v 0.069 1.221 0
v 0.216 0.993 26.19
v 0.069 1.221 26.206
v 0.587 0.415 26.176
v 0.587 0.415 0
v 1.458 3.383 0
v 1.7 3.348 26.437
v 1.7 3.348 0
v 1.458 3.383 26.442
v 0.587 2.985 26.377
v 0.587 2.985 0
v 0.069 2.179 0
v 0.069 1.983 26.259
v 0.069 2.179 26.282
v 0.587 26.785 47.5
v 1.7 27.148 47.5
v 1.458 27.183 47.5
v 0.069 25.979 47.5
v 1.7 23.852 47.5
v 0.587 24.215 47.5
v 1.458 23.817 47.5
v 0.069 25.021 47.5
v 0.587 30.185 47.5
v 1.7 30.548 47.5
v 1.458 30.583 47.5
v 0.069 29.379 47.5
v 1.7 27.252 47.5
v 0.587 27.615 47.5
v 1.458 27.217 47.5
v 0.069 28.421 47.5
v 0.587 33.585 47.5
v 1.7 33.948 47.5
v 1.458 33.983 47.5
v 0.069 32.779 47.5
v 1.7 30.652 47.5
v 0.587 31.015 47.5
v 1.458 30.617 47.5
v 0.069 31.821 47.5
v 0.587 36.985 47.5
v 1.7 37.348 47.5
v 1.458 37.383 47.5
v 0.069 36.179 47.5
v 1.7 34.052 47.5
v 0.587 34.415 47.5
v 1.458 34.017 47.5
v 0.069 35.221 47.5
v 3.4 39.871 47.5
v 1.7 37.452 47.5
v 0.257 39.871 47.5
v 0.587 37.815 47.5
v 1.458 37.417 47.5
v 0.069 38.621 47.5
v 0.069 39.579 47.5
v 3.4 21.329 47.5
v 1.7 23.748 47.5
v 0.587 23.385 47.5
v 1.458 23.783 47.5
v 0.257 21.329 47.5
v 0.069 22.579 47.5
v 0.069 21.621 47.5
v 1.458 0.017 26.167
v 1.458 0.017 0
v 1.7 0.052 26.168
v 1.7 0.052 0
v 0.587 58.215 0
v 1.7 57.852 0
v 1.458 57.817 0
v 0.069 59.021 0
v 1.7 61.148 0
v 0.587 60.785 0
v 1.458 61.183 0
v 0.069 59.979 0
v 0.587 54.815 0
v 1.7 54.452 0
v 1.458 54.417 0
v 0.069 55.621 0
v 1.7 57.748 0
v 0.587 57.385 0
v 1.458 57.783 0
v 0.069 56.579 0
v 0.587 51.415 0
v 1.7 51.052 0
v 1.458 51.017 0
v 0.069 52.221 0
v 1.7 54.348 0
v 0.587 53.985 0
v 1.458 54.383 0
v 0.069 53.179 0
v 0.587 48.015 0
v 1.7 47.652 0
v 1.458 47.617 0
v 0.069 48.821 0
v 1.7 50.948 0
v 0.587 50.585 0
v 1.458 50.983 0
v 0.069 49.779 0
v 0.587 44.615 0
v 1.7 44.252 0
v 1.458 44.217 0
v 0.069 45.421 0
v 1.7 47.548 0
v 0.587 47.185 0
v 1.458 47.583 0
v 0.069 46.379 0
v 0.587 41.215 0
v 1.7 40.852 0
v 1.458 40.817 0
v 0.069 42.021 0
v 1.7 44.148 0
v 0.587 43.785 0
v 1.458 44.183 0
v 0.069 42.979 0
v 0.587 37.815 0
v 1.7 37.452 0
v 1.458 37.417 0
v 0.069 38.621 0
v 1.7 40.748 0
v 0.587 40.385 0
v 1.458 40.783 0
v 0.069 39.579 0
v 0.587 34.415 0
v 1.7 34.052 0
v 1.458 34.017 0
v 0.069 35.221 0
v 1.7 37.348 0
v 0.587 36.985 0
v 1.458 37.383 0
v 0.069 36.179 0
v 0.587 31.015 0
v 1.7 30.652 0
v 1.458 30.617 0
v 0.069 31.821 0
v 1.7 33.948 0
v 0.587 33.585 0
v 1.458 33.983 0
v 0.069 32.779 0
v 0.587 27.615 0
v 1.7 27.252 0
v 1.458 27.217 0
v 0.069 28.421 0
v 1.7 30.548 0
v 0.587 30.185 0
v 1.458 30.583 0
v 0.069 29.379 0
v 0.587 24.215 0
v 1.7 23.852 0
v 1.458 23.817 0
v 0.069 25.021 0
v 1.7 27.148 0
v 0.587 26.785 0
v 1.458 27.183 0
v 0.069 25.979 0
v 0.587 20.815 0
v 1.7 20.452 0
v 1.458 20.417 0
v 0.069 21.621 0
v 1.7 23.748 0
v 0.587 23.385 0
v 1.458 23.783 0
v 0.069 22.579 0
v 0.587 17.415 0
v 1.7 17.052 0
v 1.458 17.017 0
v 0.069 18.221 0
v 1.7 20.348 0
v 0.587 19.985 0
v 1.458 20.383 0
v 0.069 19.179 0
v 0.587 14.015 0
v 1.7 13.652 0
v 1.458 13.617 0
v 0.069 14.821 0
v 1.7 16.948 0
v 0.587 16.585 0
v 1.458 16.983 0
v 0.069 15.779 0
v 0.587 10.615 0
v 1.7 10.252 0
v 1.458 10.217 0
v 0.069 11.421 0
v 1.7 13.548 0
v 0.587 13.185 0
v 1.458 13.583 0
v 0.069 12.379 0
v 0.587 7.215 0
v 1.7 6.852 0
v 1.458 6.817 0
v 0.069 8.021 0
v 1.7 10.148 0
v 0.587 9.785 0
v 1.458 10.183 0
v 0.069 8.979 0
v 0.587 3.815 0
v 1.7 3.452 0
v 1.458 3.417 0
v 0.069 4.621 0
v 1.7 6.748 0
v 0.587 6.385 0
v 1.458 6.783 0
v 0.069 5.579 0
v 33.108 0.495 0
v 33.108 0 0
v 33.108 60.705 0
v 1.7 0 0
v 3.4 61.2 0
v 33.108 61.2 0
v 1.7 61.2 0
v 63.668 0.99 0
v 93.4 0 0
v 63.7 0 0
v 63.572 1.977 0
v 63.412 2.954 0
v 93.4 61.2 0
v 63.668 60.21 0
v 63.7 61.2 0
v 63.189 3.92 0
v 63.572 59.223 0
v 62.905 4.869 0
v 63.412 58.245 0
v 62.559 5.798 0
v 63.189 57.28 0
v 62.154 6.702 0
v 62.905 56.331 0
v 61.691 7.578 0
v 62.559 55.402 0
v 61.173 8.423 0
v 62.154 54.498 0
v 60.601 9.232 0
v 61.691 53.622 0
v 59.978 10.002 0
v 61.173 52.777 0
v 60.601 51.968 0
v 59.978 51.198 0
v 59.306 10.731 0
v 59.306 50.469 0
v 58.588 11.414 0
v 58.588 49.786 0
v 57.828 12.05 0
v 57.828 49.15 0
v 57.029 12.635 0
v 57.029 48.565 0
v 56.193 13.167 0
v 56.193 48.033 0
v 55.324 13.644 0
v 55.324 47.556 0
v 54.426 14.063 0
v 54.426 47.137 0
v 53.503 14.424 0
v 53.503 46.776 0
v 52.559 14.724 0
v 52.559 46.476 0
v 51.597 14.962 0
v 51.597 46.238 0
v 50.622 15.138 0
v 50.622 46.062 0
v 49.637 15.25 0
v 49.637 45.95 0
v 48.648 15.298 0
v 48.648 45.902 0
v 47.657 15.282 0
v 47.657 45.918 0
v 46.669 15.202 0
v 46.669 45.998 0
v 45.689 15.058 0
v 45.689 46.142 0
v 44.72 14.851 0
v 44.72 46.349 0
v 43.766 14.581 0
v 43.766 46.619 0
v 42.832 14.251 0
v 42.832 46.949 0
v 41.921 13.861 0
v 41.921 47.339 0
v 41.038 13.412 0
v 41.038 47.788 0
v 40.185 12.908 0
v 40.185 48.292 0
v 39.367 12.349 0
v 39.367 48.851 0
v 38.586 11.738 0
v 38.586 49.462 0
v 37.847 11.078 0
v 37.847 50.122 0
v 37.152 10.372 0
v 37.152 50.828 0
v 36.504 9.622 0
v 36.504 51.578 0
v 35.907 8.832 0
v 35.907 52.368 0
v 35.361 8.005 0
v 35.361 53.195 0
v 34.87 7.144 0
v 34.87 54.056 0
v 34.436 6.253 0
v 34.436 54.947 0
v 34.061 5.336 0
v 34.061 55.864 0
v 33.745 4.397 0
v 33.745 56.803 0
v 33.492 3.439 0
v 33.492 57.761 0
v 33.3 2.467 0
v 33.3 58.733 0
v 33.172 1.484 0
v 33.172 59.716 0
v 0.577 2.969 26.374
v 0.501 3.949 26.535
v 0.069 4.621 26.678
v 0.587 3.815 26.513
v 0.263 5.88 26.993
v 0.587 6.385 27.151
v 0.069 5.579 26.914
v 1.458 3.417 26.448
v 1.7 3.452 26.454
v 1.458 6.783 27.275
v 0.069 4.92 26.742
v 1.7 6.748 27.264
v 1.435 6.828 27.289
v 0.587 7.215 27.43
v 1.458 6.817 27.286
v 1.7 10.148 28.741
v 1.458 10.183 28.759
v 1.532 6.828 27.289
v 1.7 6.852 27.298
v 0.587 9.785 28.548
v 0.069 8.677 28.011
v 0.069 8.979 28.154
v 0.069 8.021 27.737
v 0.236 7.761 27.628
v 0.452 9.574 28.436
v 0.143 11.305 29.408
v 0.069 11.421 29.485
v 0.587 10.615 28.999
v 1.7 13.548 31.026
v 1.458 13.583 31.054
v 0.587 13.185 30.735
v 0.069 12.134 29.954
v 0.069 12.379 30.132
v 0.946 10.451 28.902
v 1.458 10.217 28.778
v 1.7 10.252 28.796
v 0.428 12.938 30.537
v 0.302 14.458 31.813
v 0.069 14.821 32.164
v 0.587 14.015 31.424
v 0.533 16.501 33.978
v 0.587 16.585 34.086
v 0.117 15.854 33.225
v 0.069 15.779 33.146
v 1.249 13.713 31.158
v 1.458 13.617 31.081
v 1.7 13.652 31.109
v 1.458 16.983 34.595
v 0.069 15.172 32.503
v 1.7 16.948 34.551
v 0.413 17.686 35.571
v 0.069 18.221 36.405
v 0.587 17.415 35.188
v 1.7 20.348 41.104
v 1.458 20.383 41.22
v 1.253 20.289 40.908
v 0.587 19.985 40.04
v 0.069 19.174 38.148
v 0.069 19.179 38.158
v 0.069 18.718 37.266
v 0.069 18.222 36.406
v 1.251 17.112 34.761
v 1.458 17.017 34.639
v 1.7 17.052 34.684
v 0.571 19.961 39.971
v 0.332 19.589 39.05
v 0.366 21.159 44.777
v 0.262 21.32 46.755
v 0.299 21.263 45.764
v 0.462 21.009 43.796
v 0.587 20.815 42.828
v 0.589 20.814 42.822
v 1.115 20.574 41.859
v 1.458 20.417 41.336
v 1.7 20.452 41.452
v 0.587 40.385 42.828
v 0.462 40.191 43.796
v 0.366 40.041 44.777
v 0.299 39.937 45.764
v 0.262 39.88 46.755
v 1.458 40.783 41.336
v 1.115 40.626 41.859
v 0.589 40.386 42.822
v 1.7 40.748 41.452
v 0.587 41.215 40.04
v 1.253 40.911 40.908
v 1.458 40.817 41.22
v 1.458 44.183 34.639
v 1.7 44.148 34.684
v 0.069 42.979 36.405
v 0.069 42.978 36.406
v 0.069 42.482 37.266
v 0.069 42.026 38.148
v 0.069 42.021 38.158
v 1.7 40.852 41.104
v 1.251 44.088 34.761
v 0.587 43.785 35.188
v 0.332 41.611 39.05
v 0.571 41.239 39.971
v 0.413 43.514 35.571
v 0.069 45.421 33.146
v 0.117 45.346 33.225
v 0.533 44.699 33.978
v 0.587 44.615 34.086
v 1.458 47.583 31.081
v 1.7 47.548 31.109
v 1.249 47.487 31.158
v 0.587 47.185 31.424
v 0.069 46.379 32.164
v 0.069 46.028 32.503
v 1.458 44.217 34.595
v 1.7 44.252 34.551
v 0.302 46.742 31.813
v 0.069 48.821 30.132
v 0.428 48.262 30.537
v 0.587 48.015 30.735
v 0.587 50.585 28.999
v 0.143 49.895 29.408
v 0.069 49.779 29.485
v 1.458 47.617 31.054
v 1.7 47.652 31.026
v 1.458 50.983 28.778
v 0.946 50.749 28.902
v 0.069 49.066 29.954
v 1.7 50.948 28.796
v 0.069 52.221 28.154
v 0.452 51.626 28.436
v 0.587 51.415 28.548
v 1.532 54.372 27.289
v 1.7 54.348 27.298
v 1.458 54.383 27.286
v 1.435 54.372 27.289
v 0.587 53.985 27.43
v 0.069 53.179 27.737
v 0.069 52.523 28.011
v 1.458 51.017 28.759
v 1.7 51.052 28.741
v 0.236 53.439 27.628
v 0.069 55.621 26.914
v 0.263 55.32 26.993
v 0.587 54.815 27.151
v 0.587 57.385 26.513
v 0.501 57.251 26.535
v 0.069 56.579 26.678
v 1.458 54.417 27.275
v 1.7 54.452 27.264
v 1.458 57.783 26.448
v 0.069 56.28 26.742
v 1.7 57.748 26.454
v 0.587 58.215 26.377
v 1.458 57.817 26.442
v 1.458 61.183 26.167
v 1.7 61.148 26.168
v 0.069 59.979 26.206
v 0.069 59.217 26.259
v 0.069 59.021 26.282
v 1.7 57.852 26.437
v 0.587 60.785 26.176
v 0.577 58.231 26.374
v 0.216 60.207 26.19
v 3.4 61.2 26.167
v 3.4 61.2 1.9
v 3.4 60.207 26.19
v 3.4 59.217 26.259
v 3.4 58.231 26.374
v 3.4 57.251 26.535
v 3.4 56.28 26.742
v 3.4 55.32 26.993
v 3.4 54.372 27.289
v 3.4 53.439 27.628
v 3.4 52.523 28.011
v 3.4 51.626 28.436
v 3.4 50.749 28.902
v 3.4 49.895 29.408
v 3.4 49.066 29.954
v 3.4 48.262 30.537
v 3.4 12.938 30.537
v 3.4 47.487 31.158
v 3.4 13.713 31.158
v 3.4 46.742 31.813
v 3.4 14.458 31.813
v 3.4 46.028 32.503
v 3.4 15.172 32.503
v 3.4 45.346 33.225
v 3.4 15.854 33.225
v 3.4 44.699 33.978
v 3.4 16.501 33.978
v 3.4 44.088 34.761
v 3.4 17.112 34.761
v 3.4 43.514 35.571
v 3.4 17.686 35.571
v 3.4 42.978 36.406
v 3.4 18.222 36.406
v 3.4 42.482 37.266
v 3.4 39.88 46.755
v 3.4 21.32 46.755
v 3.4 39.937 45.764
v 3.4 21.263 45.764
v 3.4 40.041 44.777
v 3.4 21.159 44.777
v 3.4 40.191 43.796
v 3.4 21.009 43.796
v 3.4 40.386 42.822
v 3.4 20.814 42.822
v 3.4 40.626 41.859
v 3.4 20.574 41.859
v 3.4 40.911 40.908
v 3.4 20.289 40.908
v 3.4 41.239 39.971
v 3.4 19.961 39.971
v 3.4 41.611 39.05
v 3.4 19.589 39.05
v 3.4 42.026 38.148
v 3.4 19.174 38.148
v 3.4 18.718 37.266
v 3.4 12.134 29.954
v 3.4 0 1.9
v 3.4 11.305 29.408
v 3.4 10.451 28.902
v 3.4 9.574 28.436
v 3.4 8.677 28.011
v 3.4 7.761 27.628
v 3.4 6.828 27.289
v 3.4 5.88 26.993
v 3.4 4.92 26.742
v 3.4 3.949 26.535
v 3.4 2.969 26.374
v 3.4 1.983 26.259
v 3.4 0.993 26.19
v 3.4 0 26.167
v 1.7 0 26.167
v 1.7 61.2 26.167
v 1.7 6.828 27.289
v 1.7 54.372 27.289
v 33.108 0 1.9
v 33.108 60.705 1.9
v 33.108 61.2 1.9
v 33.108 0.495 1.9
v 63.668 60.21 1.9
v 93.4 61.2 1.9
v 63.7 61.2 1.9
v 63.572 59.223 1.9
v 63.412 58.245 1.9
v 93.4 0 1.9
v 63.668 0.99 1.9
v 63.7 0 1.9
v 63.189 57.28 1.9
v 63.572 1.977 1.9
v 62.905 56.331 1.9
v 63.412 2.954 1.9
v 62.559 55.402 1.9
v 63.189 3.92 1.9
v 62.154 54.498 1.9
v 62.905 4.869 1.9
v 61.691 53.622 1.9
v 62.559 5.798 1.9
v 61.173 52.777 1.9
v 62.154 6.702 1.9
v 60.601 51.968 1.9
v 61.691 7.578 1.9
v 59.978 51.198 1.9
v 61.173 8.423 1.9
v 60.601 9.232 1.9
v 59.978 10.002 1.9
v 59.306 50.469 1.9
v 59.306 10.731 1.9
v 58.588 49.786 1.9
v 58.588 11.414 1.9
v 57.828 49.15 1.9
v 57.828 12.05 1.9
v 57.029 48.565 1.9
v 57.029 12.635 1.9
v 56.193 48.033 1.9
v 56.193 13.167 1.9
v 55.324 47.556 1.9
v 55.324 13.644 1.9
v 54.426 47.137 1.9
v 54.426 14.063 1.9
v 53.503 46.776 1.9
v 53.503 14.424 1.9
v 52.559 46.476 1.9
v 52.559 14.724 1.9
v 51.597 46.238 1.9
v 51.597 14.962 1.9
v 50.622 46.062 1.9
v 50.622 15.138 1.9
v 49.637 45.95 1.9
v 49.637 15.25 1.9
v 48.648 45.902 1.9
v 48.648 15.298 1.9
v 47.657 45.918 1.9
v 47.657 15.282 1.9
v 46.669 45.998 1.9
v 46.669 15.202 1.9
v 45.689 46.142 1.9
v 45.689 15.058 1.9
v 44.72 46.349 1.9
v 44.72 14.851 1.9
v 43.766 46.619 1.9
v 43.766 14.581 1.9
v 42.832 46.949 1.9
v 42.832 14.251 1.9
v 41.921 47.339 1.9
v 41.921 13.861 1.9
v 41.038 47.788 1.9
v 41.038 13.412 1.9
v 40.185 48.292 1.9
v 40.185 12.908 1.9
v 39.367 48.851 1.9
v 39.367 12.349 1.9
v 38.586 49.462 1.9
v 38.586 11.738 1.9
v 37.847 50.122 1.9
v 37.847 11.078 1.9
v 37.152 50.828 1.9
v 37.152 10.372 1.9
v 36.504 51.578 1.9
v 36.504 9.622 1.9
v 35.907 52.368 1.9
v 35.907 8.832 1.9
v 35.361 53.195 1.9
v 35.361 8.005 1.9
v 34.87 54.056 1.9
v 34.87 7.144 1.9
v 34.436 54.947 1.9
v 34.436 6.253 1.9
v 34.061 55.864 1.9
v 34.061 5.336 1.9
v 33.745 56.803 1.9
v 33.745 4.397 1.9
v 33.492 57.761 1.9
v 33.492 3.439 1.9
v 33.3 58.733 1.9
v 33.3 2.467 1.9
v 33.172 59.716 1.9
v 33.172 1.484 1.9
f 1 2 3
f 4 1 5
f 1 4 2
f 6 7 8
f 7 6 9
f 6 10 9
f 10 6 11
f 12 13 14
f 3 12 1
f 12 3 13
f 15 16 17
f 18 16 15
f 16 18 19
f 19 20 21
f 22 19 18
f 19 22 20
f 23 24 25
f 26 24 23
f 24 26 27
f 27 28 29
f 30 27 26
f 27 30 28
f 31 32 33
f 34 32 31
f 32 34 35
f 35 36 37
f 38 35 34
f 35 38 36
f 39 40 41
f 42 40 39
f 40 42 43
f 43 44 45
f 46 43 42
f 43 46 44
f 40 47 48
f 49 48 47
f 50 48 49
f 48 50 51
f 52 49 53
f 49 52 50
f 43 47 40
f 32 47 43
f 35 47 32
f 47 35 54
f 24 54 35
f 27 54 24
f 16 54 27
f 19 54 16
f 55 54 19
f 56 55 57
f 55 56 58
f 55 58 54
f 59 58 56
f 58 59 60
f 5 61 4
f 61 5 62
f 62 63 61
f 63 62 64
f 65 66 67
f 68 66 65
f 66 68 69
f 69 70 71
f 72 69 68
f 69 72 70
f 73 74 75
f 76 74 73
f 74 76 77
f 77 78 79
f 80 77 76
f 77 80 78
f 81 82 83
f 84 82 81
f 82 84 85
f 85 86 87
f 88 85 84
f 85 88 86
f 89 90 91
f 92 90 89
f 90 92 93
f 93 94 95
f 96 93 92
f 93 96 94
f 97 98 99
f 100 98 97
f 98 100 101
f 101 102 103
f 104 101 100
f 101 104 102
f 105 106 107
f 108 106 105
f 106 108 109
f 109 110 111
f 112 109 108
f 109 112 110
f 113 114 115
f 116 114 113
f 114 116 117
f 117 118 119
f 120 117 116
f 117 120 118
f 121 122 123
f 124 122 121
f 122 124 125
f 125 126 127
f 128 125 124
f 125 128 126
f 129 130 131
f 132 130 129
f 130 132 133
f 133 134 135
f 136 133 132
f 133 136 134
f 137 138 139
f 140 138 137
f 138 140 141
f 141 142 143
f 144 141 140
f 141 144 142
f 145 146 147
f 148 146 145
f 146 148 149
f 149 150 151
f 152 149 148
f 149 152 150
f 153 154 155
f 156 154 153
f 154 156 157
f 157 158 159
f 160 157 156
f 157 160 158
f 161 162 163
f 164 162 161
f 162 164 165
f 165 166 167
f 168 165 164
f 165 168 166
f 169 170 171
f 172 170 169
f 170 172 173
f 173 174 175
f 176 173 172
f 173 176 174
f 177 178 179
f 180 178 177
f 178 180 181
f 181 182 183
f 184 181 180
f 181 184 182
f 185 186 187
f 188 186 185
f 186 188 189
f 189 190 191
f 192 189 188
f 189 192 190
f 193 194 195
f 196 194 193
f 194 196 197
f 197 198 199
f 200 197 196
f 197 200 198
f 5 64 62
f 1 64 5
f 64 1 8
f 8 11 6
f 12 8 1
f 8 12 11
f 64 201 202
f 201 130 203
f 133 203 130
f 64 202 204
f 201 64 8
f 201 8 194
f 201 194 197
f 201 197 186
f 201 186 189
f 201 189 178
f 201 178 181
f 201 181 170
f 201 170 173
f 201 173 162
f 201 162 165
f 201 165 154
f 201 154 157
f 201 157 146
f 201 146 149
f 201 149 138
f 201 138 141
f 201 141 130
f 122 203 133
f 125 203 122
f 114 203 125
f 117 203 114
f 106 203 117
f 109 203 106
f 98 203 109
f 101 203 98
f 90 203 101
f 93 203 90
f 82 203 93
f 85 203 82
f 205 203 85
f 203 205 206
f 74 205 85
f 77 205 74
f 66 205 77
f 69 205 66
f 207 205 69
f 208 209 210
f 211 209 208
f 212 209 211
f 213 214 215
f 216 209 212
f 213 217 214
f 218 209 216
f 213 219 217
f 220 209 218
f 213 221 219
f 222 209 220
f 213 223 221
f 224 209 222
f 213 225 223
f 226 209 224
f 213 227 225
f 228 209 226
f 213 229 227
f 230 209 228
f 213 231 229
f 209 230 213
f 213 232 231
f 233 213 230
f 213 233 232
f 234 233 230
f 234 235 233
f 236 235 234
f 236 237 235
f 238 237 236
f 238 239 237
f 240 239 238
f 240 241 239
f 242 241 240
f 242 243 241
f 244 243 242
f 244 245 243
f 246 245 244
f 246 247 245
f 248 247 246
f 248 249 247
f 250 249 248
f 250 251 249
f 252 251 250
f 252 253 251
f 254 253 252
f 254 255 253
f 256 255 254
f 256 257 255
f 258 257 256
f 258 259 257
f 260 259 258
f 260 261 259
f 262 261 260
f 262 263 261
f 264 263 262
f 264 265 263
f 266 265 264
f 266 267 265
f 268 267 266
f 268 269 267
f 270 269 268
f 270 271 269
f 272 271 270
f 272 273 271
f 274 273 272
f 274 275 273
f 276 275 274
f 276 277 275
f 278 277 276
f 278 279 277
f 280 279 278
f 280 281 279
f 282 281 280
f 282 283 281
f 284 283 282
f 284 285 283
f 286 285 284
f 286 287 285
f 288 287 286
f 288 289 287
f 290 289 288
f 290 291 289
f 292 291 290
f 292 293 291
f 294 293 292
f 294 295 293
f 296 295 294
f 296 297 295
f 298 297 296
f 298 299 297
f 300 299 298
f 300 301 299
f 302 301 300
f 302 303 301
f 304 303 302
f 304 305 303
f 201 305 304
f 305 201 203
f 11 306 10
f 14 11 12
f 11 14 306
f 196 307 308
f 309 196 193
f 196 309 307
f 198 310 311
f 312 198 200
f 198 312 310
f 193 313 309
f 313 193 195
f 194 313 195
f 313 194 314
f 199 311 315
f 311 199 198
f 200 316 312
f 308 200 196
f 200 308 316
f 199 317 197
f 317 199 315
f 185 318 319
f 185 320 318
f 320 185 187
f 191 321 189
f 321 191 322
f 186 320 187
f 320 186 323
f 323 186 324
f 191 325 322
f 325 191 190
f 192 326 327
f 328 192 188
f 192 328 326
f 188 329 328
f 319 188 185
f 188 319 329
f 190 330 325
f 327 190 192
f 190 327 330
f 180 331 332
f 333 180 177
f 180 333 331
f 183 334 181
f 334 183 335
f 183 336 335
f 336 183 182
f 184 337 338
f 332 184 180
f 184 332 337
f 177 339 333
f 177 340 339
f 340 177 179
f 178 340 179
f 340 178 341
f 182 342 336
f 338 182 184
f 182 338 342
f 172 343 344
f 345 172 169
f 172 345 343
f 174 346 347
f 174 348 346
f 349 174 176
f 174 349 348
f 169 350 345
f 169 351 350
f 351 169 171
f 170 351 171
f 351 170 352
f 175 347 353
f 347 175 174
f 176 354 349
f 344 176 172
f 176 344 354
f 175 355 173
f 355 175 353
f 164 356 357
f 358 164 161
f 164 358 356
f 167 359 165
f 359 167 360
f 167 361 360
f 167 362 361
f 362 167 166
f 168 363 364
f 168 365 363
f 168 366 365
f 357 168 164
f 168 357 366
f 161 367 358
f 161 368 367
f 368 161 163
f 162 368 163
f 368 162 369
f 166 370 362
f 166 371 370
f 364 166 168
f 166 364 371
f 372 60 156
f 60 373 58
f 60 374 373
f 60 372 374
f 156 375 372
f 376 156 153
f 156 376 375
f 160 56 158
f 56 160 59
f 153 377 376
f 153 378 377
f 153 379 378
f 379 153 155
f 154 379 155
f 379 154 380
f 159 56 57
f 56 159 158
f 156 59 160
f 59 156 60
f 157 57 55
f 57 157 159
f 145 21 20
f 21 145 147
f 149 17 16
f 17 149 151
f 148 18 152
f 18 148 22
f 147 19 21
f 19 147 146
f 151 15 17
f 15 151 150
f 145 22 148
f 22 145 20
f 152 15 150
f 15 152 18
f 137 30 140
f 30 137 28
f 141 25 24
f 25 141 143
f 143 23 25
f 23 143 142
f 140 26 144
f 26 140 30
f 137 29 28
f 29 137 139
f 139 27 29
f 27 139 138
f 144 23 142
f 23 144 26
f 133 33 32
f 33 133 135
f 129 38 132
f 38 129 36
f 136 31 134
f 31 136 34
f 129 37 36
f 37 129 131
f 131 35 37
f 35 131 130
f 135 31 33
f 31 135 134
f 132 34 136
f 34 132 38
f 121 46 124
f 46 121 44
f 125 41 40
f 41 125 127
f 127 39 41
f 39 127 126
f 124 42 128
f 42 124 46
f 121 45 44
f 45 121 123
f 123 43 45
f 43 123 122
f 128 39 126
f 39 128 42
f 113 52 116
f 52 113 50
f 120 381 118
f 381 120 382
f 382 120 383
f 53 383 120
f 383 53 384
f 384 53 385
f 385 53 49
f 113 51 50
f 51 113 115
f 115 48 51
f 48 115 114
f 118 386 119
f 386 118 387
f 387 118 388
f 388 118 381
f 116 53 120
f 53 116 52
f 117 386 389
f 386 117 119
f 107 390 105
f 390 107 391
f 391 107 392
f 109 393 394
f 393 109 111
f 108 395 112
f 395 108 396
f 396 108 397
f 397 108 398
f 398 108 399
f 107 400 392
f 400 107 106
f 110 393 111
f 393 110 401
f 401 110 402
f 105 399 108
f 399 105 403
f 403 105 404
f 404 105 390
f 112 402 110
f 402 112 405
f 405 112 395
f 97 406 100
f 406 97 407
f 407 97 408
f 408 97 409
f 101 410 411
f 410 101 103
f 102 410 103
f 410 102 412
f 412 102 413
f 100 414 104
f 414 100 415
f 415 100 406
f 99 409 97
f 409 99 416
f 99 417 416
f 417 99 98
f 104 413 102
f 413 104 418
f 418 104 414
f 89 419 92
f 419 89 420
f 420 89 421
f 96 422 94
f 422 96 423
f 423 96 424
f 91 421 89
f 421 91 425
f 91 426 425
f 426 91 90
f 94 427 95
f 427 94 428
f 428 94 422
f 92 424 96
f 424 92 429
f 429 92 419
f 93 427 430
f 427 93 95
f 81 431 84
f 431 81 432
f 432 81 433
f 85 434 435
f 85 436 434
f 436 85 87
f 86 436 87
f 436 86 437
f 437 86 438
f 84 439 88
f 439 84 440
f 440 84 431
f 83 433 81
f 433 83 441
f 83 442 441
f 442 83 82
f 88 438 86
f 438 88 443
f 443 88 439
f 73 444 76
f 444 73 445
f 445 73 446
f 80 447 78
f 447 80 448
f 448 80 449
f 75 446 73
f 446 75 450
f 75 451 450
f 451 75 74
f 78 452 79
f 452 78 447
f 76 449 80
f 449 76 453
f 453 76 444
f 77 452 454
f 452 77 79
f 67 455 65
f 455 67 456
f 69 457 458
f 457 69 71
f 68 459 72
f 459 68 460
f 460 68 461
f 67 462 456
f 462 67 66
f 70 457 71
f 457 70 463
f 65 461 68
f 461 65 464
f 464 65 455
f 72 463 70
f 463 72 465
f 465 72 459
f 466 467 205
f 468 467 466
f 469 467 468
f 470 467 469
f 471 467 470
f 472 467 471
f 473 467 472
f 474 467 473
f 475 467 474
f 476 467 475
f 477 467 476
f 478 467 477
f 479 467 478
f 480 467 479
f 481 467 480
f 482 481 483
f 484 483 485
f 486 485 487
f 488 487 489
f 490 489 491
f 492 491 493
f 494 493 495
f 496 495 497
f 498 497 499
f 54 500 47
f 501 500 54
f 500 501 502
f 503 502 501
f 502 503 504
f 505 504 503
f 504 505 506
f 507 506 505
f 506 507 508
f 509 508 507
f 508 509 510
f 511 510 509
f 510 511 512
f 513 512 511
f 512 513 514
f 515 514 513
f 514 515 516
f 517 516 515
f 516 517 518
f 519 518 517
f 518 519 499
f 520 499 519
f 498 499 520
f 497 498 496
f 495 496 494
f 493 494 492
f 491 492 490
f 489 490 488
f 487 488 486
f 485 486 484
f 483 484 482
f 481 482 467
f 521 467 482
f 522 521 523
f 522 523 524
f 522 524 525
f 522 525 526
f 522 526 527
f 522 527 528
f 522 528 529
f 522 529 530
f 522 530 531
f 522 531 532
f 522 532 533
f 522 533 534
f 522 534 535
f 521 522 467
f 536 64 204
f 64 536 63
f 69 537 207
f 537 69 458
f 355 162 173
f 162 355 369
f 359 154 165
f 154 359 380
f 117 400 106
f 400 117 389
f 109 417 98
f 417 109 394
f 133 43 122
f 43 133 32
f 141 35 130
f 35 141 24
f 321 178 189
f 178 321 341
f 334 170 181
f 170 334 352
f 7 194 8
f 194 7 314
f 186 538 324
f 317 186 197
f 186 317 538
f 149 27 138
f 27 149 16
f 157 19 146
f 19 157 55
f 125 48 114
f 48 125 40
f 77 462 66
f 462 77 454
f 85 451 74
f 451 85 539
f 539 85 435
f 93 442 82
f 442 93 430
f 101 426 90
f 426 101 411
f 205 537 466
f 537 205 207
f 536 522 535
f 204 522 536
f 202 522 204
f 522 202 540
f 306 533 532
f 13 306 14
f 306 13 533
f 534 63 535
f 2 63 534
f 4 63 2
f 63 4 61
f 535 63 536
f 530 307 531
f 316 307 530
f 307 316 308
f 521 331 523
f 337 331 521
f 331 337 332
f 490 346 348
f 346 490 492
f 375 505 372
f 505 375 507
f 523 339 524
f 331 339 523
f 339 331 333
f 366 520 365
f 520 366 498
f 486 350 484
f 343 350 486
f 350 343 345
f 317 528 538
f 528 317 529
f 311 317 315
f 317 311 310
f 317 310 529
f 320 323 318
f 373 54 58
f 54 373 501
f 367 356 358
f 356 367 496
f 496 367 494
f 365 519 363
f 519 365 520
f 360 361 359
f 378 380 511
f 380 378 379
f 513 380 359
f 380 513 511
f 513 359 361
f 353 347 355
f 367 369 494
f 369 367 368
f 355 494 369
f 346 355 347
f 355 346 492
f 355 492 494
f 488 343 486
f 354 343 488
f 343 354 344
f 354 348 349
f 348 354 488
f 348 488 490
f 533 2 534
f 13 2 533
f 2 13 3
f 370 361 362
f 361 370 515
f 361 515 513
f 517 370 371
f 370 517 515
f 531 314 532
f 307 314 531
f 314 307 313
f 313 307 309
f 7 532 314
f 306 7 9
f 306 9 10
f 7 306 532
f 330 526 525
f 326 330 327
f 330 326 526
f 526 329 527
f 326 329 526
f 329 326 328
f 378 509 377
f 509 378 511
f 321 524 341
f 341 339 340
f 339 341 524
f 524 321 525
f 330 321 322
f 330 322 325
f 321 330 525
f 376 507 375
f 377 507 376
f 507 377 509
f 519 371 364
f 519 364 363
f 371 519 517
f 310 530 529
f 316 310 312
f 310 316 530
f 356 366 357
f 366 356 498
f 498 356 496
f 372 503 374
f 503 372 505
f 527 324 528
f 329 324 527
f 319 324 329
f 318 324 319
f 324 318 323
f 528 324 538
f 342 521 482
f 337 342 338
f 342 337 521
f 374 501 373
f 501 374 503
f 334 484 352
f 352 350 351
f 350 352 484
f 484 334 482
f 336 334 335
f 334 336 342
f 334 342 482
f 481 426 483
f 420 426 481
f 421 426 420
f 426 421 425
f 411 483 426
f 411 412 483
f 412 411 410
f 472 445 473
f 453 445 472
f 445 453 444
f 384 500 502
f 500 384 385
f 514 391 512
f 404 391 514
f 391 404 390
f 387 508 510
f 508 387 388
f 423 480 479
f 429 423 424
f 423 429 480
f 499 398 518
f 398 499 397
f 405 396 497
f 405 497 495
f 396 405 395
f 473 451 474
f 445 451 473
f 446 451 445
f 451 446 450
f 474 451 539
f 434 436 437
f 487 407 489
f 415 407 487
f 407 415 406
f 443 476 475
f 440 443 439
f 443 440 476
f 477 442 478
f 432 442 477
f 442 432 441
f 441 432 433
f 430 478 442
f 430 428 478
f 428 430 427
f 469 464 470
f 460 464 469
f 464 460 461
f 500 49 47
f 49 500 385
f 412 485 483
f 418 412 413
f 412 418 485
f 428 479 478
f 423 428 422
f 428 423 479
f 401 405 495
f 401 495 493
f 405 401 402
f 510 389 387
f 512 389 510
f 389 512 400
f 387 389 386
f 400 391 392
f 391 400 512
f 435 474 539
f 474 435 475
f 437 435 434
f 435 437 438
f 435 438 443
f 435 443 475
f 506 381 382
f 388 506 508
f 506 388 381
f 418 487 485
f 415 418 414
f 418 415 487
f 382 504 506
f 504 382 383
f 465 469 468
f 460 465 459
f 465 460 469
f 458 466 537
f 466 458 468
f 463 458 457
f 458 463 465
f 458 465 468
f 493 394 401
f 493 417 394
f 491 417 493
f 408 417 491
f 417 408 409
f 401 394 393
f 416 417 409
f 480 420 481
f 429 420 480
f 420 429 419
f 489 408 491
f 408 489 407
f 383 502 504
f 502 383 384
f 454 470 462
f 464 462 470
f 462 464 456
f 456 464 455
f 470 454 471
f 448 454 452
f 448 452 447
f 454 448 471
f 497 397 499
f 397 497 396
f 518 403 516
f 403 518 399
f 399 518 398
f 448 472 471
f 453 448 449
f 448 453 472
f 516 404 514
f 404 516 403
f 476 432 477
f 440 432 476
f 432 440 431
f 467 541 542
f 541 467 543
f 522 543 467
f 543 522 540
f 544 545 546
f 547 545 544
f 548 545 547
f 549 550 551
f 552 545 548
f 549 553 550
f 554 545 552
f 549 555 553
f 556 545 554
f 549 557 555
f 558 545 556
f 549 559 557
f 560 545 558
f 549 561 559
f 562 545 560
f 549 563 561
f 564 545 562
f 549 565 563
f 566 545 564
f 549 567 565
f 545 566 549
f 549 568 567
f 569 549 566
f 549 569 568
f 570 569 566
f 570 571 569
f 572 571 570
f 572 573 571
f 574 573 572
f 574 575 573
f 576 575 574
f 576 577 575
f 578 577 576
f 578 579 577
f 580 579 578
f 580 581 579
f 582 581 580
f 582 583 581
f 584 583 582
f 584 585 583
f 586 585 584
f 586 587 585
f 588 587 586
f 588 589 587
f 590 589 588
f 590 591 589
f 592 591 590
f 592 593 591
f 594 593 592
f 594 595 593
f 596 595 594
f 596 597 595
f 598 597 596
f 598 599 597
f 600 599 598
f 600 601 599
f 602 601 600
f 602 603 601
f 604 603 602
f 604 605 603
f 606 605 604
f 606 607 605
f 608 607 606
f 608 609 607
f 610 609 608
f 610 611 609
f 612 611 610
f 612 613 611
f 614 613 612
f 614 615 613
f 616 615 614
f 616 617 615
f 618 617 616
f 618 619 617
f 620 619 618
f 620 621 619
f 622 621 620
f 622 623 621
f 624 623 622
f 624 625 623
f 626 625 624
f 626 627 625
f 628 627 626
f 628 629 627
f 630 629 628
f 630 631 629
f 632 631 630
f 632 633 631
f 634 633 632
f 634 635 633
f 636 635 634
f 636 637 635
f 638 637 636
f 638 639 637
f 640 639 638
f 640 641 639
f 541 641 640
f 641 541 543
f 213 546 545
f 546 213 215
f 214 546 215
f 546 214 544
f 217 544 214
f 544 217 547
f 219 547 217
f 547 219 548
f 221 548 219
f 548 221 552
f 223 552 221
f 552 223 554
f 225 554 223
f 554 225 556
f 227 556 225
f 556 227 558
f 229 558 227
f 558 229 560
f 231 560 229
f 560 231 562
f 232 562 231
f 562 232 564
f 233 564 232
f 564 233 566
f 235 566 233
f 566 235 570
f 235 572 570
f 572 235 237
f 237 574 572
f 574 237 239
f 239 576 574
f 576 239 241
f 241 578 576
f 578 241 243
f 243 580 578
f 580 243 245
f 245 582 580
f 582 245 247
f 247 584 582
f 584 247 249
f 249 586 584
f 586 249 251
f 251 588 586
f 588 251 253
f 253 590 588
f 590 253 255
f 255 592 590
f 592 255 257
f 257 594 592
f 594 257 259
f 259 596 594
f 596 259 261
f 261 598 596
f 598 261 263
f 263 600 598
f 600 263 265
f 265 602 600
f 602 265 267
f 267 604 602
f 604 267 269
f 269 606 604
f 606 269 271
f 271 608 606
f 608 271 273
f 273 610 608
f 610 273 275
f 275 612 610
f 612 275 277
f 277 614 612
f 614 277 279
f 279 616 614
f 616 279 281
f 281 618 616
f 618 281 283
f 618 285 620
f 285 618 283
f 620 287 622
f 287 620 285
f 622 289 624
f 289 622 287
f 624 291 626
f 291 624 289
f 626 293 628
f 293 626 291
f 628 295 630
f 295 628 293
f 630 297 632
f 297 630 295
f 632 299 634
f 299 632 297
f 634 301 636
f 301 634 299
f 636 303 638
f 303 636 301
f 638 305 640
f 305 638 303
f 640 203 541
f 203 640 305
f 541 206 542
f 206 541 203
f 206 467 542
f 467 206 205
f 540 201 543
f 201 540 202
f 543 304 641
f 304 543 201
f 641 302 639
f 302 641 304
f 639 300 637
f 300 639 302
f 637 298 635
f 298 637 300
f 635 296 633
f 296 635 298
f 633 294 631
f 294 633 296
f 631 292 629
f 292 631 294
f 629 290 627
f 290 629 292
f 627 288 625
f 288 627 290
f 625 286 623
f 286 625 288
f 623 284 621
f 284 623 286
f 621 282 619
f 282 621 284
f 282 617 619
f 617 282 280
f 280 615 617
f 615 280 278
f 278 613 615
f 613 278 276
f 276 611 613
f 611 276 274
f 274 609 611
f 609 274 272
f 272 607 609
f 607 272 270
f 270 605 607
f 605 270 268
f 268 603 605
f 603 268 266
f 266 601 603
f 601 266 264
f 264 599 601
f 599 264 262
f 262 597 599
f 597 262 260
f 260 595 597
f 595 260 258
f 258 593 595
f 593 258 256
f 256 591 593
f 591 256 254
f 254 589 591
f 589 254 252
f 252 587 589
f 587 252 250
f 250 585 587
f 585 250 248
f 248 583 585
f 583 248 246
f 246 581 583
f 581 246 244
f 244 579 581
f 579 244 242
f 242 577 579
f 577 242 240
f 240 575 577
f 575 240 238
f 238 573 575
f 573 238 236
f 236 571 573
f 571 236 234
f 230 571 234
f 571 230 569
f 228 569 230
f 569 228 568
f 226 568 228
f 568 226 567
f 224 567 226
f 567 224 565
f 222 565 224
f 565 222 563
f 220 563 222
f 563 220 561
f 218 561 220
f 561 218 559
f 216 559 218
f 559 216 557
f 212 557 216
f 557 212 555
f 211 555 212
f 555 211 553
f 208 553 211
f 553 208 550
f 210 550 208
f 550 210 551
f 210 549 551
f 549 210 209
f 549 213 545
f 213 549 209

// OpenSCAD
/**
 * A replacement card tray for a card shuffler.
 * All measurements are in mm.
 */

// The width of the tray.
width = 64;

// The thickness of the tray sides.
base_thickness = 1.9;

// The length of the tray base.
base_length = 90;

// The height of the tray front.
end_height = 47.5;

// The thickness of the tray front, including the ridges.
end_thickness_max = 3.4;

end_thickness_min = end_thickness_max / 2;

end_ridge_radius = end_thickness_max - end_thickness_min;

ridges = floor( width / ( end_ridge_radius * 2 ) );

// Calculate a width that will allow for an exact number of ridges.
even_width = (ridges * end_ridge_radius * 2 );   

$fs = 1;
$fa = 1;

// Base
translate([end_thickness_max, 0, 0]) union() {
    linear_extrude(base_thickness) difference() {
        square([base_length, even_width]);
        translate([base_length / 2, 0, 0]) circle(r=even_width / 4);
        translate([base_length / 2, even_width, 0]) circle(r=even_width / 4);
    };
};

// End
difference() {
    union() {
        translate([end_ridge_radius, 0, 0]) cube([end_thickness_min, even_width, end_height]);
        for (i = [0 : ridges - 1]) {
            translate([end_ridge_radius, end_ridge_radius + (i * end_ridge_radius * 2), 0]) cylinder(h=end_height, r=end_ridge_radius);
        }
    };
    
    translate([0, 0, end_height]) rotate([0, 90, 0]) cylinder(h=end_thickness_max, r=width / 3);
    translate([0, even_width, end_height]) rotate([0, 90, 0]) cylinder(h=end_thickness_max, r=width / 3);
};
